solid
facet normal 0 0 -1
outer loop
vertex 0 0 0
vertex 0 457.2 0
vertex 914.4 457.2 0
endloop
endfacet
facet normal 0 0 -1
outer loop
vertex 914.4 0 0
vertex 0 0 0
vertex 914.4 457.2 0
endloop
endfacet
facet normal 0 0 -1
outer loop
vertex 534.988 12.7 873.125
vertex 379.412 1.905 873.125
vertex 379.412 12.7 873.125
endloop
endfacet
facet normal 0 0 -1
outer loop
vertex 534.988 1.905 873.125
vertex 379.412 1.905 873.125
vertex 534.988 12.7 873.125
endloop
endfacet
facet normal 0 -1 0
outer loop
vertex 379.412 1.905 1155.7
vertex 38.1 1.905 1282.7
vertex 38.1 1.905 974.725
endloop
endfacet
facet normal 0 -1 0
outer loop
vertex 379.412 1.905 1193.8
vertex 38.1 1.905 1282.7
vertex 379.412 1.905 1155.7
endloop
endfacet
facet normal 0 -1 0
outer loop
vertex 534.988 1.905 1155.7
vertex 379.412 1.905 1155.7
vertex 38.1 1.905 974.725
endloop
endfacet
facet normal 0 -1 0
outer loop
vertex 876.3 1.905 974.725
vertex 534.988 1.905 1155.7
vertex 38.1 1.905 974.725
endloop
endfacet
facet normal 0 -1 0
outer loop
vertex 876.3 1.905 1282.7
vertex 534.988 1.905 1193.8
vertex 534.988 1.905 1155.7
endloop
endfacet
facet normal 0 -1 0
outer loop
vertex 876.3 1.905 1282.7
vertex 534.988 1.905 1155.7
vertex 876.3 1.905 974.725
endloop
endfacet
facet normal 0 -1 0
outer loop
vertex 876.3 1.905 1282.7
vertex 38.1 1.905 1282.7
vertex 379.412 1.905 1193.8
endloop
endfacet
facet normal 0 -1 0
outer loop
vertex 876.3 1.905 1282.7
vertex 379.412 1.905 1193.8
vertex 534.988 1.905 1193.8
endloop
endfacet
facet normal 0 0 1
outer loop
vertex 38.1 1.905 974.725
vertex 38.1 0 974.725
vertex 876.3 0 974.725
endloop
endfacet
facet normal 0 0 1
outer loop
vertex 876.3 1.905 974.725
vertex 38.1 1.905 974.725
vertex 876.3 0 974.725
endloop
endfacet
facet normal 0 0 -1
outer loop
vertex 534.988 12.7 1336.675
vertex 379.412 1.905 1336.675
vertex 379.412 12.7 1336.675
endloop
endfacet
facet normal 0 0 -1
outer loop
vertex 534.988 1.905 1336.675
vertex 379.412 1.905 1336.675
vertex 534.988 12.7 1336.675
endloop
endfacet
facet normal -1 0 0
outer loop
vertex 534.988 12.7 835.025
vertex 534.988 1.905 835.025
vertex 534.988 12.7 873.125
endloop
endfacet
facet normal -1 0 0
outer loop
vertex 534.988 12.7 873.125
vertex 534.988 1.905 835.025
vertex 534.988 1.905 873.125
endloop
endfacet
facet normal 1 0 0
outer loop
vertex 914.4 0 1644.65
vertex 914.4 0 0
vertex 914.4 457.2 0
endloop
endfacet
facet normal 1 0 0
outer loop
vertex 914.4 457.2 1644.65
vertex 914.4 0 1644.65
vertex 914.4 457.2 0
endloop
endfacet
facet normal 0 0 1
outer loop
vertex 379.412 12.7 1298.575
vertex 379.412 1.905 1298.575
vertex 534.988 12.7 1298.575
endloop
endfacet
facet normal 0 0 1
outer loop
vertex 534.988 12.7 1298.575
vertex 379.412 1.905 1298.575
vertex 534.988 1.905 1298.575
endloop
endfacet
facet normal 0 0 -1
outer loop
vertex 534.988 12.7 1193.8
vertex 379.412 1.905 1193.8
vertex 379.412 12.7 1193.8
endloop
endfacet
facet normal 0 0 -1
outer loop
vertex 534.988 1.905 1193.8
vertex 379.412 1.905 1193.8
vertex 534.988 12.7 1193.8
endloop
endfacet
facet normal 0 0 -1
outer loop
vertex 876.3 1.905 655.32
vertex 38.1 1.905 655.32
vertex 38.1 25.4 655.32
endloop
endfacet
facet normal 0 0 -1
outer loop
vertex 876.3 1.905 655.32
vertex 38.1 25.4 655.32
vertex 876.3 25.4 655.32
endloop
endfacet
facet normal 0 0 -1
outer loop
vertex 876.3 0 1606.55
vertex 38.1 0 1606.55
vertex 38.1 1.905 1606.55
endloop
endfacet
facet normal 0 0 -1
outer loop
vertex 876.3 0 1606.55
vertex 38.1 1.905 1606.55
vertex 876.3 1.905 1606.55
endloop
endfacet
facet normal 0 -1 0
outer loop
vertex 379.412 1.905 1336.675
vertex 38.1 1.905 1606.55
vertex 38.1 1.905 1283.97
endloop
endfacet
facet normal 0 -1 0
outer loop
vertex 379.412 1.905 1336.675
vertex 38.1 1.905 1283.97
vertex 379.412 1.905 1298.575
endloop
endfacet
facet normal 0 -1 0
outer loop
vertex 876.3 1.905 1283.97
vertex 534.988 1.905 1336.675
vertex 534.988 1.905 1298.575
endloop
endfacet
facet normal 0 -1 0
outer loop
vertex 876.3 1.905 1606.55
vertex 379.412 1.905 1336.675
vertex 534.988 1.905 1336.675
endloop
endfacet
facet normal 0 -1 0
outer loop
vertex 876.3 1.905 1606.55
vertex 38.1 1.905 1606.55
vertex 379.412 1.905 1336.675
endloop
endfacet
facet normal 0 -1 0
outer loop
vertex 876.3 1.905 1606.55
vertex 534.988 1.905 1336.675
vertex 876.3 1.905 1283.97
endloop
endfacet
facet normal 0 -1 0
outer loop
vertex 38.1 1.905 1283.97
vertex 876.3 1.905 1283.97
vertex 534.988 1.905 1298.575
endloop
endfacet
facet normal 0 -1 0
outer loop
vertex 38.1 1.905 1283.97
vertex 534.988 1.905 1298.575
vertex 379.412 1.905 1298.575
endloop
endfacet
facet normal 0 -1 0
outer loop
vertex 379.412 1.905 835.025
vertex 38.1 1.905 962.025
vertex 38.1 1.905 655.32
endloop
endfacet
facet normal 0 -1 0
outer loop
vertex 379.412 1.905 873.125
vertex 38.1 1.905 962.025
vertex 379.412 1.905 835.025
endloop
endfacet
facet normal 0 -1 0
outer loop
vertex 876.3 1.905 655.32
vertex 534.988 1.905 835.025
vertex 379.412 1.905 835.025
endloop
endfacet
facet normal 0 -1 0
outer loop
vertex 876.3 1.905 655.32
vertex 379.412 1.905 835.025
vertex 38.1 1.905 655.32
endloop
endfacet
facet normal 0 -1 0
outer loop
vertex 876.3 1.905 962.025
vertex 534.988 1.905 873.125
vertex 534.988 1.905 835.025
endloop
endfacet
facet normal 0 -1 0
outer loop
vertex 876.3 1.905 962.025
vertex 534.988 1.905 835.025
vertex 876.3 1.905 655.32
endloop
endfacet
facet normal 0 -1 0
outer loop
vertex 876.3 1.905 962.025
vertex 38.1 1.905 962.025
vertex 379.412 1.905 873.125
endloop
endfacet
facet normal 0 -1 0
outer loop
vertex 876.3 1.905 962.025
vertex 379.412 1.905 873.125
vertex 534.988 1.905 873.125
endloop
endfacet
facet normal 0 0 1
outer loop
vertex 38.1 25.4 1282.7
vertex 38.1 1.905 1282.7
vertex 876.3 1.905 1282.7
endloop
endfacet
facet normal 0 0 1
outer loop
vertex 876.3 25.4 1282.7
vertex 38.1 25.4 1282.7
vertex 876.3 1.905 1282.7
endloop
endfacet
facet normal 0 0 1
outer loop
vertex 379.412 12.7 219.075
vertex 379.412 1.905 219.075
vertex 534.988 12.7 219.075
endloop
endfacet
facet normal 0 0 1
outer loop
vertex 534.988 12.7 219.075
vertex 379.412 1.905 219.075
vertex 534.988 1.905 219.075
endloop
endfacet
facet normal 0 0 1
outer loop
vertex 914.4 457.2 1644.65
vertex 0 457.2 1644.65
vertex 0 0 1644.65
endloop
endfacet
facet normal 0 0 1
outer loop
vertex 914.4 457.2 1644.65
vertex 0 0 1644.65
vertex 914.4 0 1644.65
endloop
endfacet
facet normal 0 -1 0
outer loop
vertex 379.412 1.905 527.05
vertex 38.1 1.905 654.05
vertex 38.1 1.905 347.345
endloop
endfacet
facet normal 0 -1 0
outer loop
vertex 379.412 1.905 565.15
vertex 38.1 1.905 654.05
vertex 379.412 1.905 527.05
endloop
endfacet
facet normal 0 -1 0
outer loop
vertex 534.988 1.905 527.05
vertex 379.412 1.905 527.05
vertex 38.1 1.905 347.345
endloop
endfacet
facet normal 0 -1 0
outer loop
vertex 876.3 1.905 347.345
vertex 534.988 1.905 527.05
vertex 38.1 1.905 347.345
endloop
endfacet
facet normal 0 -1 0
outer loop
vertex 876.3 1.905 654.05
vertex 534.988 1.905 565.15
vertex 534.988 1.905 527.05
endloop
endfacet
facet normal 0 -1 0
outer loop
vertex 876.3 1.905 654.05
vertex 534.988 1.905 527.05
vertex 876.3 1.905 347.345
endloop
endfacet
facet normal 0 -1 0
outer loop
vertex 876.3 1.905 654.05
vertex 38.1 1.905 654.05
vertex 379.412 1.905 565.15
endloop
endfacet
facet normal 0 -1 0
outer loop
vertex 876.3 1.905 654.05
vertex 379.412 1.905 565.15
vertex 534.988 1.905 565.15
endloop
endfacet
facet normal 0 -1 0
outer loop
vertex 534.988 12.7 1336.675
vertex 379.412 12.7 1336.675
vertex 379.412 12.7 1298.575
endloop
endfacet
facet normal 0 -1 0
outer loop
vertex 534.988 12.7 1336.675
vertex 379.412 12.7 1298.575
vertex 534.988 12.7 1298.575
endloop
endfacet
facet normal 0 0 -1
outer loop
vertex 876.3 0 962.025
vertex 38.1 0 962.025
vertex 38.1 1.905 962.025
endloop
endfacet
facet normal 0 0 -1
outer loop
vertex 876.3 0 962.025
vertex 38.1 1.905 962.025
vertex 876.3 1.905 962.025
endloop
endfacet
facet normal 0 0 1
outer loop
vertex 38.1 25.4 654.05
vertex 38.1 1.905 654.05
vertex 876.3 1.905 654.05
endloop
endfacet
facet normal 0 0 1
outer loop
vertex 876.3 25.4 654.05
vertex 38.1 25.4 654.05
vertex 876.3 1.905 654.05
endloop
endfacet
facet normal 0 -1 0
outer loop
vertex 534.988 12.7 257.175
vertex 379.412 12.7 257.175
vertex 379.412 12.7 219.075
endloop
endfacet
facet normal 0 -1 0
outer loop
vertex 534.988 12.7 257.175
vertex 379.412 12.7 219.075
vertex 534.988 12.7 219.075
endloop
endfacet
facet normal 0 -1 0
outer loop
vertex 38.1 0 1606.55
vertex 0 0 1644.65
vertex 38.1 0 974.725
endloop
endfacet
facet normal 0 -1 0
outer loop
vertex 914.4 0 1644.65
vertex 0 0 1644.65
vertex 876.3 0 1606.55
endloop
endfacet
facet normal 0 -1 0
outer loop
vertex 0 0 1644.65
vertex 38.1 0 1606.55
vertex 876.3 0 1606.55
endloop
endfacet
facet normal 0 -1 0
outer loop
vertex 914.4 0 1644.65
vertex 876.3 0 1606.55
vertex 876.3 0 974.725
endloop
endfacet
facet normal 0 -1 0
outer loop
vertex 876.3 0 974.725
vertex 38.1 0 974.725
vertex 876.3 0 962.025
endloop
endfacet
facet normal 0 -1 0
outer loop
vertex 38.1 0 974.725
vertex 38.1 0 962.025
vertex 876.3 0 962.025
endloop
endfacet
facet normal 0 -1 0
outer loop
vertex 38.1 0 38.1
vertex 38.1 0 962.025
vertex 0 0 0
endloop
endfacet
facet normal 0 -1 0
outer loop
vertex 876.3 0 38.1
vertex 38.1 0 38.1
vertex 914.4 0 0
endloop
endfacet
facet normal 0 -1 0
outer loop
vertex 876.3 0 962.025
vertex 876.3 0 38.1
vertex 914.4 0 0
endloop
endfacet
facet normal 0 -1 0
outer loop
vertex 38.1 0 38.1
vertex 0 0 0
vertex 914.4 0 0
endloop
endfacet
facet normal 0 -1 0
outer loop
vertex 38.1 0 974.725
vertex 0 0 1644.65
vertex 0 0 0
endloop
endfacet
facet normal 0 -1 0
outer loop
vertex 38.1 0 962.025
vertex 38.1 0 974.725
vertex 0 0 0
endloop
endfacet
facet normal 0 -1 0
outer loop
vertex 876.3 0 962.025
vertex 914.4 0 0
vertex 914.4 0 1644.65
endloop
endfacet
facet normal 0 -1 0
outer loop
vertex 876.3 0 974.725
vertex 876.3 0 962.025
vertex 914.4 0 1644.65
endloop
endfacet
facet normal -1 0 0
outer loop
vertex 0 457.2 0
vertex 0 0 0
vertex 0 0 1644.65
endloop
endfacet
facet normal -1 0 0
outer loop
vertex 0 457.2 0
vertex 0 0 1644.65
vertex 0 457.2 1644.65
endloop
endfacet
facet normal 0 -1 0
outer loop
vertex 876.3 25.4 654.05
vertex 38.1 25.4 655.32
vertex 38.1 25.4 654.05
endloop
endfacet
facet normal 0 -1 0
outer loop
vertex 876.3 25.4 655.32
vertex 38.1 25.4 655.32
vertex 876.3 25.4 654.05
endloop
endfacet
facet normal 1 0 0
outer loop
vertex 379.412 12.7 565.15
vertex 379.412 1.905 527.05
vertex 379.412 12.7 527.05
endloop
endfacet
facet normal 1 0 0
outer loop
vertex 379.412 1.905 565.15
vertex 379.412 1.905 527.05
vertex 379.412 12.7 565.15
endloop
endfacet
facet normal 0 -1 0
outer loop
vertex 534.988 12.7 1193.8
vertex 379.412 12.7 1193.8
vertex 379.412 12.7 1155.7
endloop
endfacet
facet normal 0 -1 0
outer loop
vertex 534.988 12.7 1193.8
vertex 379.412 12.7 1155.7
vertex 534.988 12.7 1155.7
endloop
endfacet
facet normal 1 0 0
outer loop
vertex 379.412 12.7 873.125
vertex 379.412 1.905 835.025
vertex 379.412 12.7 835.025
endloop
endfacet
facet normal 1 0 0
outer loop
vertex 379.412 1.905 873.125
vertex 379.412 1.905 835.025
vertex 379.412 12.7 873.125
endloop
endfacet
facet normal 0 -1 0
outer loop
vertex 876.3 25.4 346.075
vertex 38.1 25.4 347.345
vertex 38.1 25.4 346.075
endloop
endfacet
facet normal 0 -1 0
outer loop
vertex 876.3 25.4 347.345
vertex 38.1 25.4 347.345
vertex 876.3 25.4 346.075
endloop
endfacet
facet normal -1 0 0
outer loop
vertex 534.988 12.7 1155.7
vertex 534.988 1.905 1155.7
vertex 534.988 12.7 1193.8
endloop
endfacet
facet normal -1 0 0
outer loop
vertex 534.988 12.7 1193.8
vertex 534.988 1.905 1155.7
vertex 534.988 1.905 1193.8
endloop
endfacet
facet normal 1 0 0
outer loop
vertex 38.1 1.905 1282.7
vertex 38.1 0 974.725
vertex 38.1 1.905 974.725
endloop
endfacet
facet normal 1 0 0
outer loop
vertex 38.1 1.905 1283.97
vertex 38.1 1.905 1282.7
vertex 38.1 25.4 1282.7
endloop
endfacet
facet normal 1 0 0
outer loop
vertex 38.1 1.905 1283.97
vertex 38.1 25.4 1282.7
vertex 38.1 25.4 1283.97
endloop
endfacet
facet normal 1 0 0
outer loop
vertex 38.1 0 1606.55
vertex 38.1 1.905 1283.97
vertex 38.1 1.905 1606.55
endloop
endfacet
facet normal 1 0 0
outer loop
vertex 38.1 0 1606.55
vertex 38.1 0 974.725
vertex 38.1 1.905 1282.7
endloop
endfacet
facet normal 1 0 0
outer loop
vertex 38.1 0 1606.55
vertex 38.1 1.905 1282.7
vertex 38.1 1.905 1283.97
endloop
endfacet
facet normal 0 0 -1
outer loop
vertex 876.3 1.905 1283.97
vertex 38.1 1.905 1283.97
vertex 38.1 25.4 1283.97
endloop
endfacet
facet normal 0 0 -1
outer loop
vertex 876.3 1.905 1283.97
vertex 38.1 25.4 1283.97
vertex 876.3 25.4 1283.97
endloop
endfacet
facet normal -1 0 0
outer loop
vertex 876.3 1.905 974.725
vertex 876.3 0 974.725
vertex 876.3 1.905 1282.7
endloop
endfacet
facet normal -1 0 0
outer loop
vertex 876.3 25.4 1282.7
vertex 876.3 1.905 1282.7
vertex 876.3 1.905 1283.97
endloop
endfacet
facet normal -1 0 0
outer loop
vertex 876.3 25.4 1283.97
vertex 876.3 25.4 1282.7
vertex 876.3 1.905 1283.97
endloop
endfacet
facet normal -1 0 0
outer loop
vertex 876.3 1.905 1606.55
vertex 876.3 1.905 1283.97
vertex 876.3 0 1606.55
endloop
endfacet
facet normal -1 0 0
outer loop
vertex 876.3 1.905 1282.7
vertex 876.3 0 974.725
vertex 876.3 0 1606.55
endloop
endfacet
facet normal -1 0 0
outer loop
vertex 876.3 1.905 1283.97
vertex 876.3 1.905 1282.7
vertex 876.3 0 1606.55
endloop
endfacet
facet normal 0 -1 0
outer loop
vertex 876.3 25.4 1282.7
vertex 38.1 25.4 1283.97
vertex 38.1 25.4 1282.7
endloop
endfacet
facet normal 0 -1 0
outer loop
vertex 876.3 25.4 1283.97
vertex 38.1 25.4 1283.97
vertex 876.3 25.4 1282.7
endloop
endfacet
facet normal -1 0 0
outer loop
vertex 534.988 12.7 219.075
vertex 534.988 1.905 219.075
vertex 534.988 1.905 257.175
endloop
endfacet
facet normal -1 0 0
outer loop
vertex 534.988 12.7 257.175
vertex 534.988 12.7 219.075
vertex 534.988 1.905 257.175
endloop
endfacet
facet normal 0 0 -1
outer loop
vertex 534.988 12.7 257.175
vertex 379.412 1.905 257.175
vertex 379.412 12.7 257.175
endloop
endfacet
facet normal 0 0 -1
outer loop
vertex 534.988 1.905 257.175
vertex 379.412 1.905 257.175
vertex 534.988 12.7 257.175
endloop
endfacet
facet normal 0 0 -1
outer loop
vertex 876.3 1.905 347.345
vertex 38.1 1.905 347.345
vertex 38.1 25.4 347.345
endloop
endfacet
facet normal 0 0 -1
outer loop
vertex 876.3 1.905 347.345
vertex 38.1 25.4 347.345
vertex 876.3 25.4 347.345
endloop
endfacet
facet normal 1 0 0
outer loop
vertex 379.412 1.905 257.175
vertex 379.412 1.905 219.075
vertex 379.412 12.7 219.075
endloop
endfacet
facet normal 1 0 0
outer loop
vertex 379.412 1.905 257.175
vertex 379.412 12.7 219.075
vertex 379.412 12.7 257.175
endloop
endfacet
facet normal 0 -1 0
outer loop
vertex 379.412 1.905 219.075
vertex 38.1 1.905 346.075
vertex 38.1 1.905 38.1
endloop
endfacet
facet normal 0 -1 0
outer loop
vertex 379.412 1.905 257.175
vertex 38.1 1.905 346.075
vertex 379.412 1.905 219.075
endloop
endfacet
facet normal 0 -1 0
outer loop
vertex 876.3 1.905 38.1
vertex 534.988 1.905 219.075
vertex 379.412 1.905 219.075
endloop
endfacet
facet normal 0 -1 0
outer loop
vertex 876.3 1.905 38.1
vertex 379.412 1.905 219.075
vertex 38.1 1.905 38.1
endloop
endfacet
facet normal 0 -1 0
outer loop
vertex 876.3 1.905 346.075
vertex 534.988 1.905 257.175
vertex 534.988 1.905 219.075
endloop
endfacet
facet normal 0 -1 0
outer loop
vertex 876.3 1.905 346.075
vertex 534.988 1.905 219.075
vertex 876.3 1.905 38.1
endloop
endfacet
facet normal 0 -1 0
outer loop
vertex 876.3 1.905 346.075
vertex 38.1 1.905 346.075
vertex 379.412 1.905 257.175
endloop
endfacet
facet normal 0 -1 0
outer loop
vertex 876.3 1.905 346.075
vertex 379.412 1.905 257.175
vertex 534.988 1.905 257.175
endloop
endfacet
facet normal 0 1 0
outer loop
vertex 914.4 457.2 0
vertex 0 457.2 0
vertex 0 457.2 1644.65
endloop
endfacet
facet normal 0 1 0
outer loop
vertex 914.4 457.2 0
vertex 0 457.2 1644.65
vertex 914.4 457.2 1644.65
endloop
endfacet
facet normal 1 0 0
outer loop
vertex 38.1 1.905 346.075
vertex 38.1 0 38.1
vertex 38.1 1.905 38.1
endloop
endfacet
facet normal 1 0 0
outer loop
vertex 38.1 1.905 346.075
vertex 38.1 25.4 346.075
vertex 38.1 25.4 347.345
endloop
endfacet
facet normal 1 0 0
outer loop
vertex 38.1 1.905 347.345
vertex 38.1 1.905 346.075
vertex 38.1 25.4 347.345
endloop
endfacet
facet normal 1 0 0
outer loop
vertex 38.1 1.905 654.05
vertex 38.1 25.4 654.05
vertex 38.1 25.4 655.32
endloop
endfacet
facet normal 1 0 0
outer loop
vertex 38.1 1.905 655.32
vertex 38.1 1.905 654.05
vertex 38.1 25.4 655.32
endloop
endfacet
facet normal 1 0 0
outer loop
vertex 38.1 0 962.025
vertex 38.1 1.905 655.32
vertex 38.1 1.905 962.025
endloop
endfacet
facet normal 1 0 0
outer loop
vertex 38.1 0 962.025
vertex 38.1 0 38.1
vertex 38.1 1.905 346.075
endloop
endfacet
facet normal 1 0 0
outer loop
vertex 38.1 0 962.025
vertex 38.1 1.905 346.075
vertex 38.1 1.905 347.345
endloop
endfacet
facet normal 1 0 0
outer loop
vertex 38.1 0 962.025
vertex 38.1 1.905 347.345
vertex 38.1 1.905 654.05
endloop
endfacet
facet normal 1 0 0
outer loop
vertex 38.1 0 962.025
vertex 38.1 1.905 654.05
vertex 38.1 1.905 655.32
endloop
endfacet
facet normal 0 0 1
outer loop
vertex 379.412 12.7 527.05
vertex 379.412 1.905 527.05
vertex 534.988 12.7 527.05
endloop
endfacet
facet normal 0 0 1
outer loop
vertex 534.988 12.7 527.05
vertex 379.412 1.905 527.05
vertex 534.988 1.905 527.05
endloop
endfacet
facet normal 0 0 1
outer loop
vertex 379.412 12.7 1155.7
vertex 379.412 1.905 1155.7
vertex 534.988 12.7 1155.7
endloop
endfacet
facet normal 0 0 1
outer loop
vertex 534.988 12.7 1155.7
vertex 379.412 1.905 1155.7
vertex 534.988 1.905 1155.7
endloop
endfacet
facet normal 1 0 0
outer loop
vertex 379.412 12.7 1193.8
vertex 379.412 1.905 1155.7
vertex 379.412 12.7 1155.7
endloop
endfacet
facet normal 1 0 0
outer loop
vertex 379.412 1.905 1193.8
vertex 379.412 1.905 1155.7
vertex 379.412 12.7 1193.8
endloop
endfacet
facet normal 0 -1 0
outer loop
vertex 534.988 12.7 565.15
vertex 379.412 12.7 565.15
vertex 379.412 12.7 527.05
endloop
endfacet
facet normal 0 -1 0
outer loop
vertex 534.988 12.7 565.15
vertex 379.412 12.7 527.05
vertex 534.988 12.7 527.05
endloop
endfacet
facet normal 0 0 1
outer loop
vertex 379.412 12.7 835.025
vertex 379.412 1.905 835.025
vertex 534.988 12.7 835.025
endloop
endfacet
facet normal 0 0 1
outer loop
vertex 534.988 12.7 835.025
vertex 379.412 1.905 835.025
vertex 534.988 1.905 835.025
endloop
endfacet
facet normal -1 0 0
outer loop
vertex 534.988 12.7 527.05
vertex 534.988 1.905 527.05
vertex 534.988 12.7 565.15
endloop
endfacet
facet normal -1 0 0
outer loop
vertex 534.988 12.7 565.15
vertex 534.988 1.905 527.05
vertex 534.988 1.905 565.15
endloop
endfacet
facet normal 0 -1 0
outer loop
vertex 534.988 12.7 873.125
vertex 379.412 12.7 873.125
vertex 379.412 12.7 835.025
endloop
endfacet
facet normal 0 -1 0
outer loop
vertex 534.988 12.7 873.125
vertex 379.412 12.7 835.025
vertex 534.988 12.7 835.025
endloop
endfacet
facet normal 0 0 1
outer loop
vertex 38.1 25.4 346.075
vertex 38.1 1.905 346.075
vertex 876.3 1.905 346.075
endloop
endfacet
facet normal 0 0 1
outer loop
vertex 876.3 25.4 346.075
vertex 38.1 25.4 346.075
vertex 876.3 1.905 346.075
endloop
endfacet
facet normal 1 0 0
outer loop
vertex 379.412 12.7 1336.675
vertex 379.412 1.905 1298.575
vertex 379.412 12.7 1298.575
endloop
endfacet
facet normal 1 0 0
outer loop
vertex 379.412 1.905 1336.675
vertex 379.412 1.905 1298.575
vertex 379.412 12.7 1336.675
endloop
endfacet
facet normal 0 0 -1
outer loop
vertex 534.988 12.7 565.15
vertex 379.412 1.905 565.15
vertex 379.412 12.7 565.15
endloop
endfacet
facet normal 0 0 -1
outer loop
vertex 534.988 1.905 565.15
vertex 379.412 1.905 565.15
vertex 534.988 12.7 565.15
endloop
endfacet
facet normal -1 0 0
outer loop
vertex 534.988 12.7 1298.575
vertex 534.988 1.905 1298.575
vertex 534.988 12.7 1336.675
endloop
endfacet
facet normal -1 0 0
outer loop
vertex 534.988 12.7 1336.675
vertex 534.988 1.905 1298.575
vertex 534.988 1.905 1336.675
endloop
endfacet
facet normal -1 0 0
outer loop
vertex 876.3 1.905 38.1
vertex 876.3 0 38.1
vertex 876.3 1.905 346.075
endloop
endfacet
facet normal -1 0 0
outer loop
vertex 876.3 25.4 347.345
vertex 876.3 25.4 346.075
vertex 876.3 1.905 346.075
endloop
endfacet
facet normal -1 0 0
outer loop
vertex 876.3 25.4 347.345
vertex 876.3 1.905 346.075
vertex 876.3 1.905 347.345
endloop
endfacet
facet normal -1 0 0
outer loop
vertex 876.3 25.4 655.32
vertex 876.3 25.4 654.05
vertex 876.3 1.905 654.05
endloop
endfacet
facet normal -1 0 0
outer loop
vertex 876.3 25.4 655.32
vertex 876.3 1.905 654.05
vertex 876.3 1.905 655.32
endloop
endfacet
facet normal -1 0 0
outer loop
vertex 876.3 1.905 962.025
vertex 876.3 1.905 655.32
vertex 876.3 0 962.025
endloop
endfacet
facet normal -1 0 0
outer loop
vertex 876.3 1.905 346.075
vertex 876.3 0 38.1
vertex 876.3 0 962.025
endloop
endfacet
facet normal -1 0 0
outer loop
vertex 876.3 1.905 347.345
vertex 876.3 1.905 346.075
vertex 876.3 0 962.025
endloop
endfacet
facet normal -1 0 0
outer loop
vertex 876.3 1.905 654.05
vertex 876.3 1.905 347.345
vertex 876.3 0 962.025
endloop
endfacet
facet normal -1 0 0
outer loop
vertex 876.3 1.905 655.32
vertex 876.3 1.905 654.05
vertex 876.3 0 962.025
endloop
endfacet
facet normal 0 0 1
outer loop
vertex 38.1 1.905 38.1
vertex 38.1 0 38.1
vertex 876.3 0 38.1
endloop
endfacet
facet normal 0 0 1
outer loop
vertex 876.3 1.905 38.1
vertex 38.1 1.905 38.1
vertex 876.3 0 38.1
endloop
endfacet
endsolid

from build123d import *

# Parameters (mm, degrees)
F0_W     = 914.4
F0_H     = 457.2
F1_DEPTH = 1644.65
F2_W     = 838.2
F2_H     = 307.975
F2_W_2   = 155.575
F2_H_2   = 38.1
F2_H_3   = 306.705
F2_H_4   = 322.58
F3_DEPTH = 1.905
F2_H_5   = 1.27
F4_DEPTH = 25.4
F5_DEPTH = 12.7


with BuildPart() as f1:
    # F0 (on Top) → F1 (new body)
    with BuildSketch(Plane.XY):
        with Locations((457.2, 228.6)):
            Rectangle(F0_W, F0_H)
    extrude(amount=F1_DEPTH)

    # F2 (on face) → F3 (cut)
    with BuildSketch(Plane.XZ):
        with Locations((457.2, 192.0875)):
            Rectangle(F2_W, F2_H)
        with Locations((457.2, 238.125)):
            Rectangle(F2_W_2, F2_H_2, mode=Mode.SUBTRACT)
        with Locations((457.2, 500.6975)):
            Rectangle(F2_W, F2_H_3)
        with Locations((457.2, 546.1)):
            Rectangle(F2_W_2, F2_H_2, mode=Mode.SUBTRACT)
        with Locations((457.2, 808.6725)):
            Rectangle(F2_W, F2_H_3)
        with Locations((457.2, 854.075)):
            Rectangle(F2_W_2, F2_H_2, mode=Mode.SUBTRACT)
        with Locations((457.2, 1128.7125)):
            Rectangle(F2_W, F2_H)
        with Locations((457.2, 1174.75)):
            Rectangle(F2_W_2, F2_H_2, mode=Mode.SUBTRACT)
        with Locations((457.2, 1445.26)):
            Rectangle(F2_W, F2_H_4)
        with Locations((457.2, 1317.625)):
            Rectangle(F2_W_2, F2_H_2, mode=Mode.SUBTRACT)
    extrude(amount=-F3_DEPTH, mode=Mode.SUBTRACT)

    # F2 (on face) → F4 (cut)
    with BuildSketch(Plane.XZ):
        with Locations((457.2, 346.71)):
            Rectangle(F2_W, F2_H_5)
        with Locations((457.2, 654.685)):
            Rectangle(F2_W, F2_H_5)
        with Locations((457.2, 1283.335)):
            Rectangle(F2_W, F2_H_5)
    extrude(amount=-F4_DEPTH, mode=Mode.SUBTRACT)

    # F2 (on face) → F5 (cut)
    with BuildSketch(Plane.XZ):
        with Locations((457.2, 1317.625)):
            Rectangle(F2_W_2, F2_H_2)
        with Locations((457.2, 1174.75)):
            Rectangle(F2_W_2, F2_H_2)
        with Locations((457.2, 854.075)):
            Rectangle(F2_W_2, F2_H_2)
        with Locations((457.2, 546.1)):
            Rectangle(F2_W_2, F2_H_2)
        with Locations((457.2, 238.125)):
            Rectangle(F2_W_2, F2_H_2)
    extrude(amount=-F5_DEPTH, mode=Mode.SUBTRACT)


solid = f1.part
